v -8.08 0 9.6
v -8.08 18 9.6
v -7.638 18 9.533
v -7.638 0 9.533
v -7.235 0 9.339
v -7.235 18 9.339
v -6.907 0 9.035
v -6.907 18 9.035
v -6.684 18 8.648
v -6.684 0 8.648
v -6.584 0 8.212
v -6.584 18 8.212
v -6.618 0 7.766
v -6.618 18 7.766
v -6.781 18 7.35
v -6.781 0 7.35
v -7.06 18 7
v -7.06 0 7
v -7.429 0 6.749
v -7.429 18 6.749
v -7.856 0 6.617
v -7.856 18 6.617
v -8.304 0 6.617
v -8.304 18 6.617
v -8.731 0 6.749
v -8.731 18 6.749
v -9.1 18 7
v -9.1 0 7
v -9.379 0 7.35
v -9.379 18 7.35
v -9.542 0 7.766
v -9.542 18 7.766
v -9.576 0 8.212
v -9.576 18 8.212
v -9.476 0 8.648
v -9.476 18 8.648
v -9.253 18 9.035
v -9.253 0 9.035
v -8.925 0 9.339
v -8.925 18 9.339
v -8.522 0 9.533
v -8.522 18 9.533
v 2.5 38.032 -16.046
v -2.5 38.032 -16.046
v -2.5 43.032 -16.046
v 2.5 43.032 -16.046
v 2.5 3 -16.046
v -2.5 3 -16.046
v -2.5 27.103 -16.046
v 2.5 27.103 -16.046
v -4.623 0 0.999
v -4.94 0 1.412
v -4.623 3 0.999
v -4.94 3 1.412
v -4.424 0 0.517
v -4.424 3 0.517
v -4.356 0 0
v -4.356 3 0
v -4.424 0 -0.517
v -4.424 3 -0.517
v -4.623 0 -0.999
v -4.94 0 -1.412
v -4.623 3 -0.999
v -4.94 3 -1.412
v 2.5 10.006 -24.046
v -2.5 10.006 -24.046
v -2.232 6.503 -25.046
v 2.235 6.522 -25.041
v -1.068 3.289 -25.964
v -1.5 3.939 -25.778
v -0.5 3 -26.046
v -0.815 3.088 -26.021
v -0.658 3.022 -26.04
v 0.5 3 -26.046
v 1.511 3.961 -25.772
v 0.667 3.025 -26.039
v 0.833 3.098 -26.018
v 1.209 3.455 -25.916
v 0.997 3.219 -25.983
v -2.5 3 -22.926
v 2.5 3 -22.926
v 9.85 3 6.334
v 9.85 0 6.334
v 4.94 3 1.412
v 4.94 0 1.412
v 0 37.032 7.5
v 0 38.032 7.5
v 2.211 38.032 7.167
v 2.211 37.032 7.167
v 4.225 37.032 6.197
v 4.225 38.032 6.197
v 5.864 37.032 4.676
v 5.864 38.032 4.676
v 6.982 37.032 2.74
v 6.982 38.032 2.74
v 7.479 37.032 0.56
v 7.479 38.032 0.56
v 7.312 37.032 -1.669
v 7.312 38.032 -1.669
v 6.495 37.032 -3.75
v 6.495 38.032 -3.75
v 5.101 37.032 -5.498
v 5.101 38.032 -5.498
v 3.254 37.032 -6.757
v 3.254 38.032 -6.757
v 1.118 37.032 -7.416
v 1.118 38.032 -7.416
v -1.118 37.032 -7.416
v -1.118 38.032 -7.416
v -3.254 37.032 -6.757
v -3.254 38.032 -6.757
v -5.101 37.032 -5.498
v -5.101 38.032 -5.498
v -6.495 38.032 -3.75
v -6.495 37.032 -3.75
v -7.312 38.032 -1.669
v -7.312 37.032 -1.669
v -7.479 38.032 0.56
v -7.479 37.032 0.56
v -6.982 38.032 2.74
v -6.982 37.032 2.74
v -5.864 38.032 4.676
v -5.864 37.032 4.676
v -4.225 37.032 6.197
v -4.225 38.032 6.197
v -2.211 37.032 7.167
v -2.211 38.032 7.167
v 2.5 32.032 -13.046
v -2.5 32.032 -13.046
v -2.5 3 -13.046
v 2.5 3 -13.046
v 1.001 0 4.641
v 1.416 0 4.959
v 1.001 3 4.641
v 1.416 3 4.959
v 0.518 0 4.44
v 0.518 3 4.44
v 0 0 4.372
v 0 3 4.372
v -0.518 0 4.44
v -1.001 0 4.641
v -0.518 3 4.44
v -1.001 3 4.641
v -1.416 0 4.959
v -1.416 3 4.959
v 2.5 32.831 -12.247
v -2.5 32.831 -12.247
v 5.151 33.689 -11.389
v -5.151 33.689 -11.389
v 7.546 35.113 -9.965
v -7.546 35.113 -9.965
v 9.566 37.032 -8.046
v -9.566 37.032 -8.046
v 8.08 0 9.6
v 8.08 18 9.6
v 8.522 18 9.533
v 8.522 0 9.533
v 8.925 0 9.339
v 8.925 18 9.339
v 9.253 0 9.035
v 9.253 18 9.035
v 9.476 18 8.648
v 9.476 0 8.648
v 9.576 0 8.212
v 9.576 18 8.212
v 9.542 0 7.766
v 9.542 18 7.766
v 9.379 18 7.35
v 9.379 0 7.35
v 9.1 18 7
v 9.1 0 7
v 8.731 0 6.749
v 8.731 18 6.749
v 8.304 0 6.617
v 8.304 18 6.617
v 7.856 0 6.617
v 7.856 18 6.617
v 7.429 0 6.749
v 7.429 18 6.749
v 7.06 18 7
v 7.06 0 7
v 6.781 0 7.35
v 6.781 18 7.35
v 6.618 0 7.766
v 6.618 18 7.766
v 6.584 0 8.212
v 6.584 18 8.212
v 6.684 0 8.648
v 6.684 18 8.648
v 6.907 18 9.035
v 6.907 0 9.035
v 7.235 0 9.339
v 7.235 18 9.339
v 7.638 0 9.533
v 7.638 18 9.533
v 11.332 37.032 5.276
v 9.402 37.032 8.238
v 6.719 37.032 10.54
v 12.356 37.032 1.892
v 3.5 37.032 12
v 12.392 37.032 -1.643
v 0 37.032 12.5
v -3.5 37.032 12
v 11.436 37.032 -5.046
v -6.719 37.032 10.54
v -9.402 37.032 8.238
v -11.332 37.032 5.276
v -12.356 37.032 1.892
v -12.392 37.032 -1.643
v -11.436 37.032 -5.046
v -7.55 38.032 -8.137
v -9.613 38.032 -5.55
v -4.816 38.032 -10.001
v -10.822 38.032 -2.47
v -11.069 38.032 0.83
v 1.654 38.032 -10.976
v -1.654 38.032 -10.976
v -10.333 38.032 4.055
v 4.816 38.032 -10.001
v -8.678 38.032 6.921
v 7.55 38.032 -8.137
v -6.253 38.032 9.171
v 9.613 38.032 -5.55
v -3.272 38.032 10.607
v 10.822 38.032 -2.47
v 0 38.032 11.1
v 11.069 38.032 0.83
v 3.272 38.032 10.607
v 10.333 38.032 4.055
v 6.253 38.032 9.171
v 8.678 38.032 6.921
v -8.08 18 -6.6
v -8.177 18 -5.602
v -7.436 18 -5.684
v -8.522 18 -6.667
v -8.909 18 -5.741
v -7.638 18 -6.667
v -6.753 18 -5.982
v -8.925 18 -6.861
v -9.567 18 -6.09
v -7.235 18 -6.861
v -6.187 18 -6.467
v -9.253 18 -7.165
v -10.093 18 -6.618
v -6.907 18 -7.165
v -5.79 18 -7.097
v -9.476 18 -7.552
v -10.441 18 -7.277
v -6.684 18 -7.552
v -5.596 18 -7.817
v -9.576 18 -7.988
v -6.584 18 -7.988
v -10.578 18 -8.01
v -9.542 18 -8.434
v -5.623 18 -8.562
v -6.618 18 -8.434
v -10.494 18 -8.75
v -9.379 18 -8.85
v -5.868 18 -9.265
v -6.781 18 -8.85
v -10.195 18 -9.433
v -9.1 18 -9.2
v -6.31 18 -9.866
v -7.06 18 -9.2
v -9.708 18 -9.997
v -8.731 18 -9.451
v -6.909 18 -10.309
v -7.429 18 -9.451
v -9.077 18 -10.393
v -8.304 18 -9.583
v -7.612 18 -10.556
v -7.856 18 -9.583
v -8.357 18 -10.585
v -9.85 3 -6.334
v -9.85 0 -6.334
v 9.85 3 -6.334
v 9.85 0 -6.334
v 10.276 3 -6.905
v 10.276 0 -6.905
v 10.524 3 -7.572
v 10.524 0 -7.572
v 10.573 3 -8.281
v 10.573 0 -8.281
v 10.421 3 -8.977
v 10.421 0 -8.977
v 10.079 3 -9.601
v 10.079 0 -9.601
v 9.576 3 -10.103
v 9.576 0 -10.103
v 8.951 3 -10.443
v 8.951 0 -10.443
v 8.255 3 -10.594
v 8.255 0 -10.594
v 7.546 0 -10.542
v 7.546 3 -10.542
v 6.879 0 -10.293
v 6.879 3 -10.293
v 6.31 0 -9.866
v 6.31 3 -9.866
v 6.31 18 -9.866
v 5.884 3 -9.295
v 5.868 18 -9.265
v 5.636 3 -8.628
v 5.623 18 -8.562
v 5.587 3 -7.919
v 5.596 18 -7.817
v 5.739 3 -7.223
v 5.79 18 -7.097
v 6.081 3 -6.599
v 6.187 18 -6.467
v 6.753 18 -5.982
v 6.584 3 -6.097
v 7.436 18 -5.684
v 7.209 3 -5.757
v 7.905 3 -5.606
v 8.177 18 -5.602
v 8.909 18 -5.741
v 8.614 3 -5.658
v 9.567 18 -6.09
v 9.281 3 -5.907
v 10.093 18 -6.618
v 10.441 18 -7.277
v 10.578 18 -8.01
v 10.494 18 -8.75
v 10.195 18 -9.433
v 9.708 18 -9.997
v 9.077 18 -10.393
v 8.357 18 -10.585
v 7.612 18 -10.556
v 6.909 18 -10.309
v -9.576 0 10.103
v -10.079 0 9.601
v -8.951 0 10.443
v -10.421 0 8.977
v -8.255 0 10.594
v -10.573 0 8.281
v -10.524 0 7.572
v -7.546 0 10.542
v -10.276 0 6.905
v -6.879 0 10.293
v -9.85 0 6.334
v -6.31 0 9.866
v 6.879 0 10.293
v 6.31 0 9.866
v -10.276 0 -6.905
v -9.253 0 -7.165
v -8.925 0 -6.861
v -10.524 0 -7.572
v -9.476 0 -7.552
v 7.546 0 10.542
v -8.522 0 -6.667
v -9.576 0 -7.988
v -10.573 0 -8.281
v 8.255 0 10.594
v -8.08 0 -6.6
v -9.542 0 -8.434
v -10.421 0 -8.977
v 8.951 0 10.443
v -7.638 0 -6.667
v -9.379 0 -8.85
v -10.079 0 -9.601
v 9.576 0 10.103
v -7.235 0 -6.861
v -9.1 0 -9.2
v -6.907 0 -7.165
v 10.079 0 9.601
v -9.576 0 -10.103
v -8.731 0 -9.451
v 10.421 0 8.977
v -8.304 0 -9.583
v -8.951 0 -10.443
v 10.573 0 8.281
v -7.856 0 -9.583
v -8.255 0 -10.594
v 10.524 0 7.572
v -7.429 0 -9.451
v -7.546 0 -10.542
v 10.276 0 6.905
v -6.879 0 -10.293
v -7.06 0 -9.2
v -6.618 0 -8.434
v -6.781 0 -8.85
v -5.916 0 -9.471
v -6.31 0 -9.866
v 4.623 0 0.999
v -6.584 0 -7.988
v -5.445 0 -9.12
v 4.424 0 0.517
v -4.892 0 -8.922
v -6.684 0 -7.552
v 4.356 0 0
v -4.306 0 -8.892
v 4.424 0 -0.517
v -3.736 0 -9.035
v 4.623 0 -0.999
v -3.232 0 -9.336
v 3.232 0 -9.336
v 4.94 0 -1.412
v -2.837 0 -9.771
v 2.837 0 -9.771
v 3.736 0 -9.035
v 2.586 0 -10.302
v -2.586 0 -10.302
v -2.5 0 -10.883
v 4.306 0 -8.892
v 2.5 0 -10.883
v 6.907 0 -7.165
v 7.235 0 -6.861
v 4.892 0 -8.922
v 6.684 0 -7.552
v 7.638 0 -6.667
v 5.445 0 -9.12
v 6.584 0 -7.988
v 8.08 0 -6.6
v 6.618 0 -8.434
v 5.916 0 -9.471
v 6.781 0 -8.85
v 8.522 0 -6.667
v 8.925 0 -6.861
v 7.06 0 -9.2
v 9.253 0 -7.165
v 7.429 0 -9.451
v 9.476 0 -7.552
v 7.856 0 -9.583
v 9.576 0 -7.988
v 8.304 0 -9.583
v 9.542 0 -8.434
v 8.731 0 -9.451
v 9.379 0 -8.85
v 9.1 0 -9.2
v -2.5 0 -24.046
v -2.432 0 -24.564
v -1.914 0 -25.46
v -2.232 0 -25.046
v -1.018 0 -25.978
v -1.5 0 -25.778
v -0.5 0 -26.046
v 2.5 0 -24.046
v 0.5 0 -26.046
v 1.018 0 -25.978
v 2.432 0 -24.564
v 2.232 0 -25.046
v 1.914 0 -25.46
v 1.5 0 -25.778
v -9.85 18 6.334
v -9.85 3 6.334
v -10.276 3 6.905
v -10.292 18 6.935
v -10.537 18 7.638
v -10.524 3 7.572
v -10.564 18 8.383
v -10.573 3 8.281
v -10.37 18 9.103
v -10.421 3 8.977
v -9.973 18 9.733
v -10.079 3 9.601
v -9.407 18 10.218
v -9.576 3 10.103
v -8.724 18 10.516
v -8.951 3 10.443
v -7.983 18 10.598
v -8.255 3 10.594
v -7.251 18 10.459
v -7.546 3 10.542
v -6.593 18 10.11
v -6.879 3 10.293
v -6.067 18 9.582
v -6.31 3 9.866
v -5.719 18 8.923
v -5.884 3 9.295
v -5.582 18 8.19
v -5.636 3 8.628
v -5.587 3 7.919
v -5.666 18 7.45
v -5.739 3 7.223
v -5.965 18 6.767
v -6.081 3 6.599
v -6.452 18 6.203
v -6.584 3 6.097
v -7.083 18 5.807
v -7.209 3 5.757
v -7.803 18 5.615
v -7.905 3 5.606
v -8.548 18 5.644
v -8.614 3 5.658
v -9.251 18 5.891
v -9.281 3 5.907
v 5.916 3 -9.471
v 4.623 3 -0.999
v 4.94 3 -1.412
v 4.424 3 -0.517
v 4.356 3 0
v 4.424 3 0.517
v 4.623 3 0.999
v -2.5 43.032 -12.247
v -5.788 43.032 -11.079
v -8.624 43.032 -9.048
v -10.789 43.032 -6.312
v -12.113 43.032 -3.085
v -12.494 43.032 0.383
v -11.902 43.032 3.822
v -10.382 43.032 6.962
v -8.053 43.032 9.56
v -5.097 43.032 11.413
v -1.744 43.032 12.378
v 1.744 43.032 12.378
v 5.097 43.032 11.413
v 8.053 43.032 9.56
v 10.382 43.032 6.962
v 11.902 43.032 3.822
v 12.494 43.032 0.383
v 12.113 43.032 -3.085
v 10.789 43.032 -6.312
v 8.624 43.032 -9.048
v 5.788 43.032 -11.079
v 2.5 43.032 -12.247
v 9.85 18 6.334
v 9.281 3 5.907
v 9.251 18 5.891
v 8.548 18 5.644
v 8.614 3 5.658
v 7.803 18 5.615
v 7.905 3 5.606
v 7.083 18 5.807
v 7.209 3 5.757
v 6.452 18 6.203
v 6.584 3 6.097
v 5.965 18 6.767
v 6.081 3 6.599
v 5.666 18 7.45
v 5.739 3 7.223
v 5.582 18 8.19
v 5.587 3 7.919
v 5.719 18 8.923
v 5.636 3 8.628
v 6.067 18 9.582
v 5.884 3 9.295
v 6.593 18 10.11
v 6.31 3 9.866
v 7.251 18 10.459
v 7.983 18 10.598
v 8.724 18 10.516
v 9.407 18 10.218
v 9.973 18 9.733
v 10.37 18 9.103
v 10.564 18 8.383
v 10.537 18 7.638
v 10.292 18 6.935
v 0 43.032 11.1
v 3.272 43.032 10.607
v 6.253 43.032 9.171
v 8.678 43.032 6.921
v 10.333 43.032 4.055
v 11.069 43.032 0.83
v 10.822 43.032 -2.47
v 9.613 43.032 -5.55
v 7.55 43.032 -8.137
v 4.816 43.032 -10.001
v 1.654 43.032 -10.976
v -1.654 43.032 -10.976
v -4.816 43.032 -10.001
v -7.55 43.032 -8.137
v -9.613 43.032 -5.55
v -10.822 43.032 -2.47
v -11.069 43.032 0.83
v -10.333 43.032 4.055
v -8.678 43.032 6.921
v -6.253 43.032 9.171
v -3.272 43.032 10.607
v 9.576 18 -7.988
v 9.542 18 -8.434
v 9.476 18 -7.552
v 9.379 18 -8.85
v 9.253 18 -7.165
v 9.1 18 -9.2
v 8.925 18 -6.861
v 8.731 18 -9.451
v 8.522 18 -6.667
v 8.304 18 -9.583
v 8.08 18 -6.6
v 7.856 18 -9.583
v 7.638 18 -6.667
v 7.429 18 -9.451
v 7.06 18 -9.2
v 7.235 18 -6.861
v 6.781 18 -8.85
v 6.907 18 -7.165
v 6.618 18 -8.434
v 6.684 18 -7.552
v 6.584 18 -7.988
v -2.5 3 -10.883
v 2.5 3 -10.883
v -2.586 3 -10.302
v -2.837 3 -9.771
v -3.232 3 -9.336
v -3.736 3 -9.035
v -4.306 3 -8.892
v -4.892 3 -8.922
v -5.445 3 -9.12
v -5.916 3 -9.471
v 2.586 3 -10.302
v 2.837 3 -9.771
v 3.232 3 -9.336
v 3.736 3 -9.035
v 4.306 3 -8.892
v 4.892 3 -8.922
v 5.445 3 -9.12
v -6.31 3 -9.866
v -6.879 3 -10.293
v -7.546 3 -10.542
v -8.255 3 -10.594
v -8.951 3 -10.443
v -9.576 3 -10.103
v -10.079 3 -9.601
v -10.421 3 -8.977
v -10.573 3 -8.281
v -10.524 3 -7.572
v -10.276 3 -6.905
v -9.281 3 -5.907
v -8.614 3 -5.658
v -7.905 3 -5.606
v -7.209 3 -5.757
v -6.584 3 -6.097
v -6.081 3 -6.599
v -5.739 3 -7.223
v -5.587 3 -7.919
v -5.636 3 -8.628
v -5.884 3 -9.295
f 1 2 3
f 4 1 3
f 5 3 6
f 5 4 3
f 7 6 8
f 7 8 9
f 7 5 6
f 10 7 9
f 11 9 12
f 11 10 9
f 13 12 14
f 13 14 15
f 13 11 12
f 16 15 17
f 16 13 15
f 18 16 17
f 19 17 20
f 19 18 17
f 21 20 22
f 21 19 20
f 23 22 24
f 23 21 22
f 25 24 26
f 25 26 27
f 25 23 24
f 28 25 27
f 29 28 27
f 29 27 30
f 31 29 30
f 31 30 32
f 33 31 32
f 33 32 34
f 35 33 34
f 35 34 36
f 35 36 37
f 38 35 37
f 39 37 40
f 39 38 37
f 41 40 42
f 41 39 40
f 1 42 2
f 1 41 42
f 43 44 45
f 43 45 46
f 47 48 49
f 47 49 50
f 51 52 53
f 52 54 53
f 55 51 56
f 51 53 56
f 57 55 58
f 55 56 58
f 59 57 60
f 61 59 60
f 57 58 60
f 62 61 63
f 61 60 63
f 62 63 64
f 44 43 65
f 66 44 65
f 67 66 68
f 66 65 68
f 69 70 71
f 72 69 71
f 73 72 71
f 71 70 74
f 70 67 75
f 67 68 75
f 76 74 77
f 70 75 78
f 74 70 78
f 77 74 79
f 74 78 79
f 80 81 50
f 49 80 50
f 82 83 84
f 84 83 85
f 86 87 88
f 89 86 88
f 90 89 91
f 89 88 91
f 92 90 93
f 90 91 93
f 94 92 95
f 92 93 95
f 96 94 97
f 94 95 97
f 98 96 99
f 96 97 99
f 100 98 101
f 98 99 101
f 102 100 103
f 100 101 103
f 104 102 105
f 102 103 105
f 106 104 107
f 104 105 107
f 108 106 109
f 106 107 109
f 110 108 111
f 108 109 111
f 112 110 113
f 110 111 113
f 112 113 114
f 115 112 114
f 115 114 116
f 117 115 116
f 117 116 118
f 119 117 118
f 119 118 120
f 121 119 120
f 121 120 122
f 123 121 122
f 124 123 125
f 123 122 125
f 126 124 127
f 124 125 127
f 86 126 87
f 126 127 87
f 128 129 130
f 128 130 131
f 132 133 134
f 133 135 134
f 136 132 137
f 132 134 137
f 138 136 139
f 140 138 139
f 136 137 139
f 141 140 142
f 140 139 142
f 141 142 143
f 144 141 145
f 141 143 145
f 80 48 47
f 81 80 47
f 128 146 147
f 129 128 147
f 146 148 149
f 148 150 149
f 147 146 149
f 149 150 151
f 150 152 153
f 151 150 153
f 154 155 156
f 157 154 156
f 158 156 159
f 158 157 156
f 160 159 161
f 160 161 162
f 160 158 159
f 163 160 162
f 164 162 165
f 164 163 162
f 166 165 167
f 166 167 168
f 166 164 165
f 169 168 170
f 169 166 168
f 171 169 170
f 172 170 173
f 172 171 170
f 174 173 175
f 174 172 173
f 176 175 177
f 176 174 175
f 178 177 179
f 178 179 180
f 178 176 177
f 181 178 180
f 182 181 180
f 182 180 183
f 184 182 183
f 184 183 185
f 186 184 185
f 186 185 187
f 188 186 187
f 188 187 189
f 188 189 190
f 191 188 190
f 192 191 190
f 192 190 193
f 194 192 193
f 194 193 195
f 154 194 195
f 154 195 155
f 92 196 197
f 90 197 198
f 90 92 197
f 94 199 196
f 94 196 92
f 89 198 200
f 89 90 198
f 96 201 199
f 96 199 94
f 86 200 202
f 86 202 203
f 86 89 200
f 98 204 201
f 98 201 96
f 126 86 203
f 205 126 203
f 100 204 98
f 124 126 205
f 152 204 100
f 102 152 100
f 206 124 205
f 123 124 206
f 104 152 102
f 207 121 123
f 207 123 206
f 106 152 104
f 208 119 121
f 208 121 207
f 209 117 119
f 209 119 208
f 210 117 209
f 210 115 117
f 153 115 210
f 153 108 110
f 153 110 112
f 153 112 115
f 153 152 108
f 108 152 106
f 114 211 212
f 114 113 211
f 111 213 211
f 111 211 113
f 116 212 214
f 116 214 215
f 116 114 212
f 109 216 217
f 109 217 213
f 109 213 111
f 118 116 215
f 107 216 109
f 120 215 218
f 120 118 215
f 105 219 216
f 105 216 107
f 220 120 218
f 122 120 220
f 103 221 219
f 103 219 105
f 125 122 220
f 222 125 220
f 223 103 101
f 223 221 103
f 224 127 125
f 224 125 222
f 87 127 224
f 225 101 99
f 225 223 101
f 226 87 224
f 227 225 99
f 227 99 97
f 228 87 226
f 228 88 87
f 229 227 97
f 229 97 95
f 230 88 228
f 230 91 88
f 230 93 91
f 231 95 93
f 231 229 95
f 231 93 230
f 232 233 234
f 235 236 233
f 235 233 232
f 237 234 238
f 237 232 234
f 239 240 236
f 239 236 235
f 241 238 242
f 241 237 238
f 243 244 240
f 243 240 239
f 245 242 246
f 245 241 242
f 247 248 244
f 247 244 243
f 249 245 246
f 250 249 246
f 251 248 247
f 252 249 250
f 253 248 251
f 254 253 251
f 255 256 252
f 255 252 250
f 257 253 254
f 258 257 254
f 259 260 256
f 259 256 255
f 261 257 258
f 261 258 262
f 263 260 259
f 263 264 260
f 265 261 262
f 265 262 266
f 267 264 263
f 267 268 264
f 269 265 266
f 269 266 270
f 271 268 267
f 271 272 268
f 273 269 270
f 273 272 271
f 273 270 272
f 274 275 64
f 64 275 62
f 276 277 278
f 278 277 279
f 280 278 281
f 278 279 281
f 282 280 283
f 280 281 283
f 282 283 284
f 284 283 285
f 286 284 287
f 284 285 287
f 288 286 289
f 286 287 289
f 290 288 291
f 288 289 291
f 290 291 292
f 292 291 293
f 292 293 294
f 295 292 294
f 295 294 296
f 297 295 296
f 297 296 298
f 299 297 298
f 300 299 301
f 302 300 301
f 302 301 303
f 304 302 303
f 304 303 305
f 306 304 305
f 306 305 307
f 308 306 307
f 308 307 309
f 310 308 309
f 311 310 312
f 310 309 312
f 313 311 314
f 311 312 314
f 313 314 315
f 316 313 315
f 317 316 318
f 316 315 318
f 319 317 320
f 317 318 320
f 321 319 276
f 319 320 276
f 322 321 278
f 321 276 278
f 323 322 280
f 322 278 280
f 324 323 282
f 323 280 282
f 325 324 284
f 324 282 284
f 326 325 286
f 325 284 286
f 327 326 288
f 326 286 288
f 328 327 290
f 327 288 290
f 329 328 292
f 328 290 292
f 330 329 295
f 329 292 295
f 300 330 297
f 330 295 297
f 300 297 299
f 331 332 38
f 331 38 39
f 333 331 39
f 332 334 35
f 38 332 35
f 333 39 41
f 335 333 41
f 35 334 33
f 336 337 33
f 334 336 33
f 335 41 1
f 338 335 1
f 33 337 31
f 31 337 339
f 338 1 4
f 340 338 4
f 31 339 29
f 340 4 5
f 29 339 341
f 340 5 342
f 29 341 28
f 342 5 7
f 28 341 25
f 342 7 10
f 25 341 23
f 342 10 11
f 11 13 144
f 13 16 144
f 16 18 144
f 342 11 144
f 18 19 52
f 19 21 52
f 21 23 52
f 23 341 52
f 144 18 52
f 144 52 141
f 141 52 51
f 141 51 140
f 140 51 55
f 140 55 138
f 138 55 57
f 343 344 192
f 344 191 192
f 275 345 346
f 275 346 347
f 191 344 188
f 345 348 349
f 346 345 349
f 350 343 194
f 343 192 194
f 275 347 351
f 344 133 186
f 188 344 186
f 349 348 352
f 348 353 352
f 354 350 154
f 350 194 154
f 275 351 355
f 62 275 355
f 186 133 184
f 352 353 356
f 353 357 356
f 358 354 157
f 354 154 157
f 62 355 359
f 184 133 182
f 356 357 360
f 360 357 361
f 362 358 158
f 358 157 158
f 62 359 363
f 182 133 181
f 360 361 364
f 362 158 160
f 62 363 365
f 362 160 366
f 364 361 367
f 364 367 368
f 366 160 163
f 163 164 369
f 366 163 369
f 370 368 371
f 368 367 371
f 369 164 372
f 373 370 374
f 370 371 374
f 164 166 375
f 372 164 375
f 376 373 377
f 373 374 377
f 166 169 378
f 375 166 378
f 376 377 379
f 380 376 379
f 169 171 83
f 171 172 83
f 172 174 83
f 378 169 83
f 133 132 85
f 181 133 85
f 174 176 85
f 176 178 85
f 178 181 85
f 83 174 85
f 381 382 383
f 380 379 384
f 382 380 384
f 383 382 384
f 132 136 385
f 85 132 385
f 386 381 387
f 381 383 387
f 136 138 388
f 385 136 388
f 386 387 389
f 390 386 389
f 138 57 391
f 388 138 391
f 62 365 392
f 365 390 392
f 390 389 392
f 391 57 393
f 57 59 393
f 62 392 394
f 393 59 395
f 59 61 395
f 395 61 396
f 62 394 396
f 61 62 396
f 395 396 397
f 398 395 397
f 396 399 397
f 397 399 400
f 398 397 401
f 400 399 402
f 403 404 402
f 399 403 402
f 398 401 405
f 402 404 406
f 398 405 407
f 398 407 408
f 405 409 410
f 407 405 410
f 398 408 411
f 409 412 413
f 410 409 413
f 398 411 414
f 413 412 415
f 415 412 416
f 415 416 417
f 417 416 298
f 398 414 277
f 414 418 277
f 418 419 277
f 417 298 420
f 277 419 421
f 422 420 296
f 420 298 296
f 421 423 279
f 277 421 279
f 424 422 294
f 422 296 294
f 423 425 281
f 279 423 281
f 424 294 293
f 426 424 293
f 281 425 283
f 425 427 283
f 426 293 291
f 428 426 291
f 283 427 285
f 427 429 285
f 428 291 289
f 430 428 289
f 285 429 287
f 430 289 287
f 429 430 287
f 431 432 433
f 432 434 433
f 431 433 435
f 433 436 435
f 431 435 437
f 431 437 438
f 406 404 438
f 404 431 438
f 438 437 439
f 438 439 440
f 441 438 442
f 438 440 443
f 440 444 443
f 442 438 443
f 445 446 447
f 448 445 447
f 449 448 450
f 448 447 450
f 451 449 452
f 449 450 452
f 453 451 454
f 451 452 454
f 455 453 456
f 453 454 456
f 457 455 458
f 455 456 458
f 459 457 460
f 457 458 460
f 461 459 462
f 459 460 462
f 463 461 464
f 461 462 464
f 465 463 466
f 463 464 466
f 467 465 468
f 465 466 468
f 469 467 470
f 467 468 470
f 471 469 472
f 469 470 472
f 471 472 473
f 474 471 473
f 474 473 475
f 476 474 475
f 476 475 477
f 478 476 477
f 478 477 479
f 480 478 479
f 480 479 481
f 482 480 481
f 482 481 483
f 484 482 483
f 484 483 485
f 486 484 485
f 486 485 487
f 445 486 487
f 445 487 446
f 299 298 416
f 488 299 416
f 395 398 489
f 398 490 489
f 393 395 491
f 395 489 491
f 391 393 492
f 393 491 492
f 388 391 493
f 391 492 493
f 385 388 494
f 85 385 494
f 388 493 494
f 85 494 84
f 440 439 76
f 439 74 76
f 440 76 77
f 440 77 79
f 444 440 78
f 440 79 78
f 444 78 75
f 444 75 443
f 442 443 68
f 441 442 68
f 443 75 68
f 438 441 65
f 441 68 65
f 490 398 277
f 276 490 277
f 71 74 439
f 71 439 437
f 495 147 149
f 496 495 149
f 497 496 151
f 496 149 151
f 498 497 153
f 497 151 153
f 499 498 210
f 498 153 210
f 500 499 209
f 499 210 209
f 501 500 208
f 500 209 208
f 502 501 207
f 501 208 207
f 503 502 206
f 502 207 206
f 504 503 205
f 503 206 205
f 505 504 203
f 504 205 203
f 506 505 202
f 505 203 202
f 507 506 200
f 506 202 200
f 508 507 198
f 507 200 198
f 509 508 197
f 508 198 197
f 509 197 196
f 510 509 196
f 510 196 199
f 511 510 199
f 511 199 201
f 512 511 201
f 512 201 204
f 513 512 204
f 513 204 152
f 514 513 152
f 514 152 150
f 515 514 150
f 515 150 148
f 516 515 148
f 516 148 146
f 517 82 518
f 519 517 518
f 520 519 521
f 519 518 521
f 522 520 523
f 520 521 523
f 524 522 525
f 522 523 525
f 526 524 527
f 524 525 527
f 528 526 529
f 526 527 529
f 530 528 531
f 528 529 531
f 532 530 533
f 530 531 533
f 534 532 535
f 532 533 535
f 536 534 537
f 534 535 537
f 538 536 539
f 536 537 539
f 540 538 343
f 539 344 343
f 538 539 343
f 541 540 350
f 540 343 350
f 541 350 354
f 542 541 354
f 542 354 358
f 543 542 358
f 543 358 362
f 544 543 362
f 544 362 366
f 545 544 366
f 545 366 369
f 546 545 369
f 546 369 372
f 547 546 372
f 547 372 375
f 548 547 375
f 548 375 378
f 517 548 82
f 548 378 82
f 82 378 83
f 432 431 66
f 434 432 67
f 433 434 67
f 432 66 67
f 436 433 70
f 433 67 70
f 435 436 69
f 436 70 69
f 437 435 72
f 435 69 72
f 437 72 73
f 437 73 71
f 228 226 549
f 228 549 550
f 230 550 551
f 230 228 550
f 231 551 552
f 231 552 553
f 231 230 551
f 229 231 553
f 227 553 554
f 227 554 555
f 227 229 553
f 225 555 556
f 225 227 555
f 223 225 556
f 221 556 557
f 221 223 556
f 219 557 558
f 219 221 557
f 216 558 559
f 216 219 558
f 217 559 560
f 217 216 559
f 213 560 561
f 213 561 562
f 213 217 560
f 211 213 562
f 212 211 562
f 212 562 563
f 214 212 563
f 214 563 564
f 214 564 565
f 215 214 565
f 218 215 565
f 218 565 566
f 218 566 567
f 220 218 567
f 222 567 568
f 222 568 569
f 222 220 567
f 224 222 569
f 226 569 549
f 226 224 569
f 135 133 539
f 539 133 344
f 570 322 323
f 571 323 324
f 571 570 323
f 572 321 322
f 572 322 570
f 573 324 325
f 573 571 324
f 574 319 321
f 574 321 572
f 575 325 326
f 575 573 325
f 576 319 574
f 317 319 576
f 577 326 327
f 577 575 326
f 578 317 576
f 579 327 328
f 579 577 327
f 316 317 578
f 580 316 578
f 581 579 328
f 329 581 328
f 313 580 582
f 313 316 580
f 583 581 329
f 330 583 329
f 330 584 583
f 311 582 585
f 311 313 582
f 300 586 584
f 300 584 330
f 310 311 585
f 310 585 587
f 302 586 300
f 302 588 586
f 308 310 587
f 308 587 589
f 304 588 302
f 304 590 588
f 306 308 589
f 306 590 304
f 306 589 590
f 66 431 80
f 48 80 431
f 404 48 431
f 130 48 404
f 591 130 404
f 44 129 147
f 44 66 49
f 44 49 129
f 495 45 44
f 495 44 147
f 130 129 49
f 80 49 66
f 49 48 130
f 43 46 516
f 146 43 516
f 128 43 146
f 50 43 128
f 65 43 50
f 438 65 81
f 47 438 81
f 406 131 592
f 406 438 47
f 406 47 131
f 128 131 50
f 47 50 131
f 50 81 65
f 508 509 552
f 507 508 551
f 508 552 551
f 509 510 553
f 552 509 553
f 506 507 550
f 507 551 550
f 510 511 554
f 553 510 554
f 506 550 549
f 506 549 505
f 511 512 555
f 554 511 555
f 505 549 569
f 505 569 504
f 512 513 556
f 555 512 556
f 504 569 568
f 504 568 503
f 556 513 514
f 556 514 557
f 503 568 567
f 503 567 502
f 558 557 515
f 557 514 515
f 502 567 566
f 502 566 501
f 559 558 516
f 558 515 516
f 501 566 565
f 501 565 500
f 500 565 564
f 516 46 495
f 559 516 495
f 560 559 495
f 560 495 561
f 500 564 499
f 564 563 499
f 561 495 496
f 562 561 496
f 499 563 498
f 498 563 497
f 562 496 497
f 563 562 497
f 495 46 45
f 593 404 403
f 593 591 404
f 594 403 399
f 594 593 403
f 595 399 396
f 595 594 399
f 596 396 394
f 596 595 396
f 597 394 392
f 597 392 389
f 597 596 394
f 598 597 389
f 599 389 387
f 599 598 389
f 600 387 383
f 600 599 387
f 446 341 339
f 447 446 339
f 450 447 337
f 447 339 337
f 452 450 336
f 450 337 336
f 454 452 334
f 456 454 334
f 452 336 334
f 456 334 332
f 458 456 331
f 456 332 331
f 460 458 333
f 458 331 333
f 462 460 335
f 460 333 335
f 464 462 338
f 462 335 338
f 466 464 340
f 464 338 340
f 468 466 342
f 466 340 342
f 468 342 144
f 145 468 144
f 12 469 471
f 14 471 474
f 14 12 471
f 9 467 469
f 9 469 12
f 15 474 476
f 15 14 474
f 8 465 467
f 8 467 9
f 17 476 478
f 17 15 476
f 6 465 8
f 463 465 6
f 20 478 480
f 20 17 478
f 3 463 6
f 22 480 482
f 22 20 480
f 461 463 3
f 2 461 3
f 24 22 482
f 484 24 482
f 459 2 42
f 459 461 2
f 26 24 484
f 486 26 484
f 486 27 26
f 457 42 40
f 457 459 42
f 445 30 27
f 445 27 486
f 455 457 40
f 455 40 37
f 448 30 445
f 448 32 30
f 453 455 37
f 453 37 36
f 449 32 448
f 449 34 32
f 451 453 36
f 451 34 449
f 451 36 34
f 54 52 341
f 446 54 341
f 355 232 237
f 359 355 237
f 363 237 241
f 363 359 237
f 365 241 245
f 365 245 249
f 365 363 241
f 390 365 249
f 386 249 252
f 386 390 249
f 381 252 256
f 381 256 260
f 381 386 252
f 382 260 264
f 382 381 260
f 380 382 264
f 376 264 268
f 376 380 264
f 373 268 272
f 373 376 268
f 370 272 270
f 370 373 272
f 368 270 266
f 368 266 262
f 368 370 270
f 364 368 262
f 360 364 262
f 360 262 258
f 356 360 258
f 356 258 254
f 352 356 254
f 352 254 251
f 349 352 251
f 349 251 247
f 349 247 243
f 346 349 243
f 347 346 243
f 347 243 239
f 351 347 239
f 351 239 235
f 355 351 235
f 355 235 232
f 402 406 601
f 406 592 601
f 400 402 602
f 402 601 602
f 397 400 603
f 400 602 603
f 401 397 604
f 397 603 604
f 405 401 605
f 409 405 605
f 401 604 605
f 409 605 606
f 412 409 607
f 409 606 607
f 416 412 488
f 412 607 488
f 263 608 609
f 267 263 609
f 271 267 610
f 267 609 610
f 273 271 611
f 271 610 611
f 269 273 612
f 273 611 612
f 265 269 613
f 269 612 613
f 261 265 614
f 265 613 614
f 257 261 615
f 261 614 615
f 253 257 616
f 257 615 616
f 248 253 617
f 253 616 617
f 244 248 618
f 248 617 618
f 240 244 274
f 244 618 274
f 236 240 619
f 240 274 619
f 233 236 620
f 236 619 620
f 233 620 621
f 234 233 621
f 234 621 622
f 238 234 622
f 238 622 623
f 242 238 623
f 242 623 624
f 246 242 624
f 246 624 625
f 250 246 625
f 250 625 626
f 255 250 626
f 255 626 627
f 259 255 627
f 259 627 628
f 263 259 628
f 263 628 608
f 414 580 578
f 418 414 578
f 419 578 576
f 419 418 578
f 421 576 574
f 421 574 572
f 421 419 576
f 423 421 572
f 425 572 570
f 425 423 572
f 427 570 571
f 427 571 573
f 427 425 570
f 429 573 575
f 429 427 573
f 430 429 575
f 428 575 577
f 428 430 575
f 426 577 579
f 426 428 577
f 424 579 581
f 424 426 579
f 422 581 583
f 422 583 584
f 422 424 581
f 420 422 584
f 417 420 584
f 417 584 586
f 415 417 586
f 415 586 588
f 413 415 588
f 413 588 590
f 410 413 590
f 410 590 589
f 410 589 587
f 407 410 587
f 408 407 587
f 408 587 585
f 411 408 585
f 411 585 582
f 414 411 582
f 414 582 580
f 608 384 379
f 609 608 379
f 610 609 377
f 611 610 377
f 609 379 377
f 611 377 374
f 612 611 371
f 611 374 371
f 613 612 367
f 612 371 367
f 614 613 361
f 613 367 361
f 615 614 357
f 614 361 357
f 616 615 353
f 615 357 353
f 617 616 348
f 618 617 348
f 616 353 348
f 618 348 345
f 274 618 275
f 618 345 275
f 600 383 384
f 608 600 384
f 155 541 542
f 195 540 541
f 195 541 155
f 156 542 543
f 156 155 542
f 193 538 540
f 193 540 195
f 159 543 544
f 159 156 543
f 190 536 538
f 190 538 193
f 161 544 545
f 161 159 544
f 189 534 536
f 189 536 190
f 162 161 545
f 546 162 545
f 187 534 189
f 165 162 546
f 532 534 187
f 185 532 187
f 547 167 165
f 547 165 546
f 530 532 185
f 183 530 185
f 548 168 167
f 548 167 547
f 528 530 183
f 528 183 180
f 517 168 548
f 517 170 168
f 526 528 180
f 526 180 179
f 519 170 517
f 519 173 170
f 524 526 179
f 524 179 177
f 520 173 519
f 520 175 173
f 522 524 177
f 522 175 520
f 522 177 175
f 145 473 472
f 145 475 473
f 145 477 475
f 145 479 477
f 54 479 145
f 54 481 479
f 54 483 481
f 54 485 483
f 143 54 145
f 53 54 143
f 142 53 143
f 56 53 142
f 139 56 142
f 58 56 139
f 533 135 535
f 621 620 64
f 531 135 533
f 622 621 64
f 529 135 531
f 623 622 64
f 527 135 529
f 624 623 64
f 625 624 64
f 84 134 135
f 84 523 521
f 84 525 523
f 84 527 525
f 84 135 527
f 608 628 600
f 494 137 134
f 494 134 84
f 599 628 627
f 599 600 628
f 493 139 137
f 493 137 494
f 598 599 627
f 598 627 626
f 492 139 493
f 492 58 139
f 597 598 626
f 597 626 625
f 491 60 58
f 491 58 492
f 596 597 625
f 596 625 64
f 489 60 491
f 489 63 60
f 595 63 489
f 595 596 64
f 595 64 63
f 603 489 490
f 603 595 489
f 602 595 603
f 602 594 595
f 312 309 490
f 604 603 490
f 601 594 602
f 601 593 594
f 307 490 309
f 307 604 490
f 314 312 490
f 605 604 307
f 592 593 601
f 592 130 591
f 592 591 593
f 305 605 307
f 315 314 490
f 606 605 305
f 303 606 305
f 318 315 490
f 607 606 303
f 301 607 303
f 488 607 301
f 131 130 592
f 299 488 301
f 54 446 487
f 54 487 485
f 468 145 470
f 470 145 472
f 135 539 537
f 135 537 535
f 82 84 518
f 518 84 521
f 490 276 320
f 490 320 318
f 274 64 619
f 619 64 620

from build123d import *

# Parameters (mm, degrees)
SKETCH_1_R           = 1.5
EXTRUDE_1_DEPTH      = 3
SKETCH_2_R           = 2.5
SKETCH_2_R_2         = 1.5
EXTRUDE_2_DEPTH      = 15
SKETCH_3_W           = 5
SKETCH_3_H           = 3
EXTRUDE_3_DEPTH      = 35.032354187
EXTRUDE_4_DEPTH      = 5
SKETCH_5_R           = 12.5
SKETCH_5_R_2         = 7.5
EXTRUDE_5_DEPTH      = 1
SKETCH_6_R           = 12.5
SKETCH_6_R_2         = 11.1
EXTRUDE_6_DEPTH      = 5
EXTRUDE_7_DEPTH      = 5
EXTRUDE_7_DEPTH_BACK = 1
CHAMFER_1_SIZE       = 5
FILLET_1_R           = 2


with BuildPart() as part:
    # Эскиз1 → Бобышка-Вытянуть1 (new body)
    with BuildSketch(Plane(origin=(0, 0, 0), x_dir=(1, 0, 0), z_dir=(0, 1, 0))):
        with BuildLine():
            Line((-6.310049273, -9.865580478), (0, -3.539912271))
            Line((0, -3.539912271), (6.310049273, -9.865580478))
            ThreePointArc((6.310049273, -9.865580478), (9.845580478, -9.869950727), (9.849950727, -6.334419522))
            Line((9.849950727, -6.334419522), (3.531171747, 0))
            Line((3.531171747, 0), (9.849950727, 6.334419522))
            ThreePointArc((9.849950727, 6.334419522), (9.845580478, 9.869950727), (6.310049273, 9.865580478))
            Line((6.310049273, 9.865580478), (2.5, 6.04610039))
            Line((2.5, 6.04610039), (2.5, 26.04610039))
            Line((2.5, 26.04610039), (-2.5, 26.04610039))
            Line((-2.5, 26.04610039), (-2.5, 6.04610039))
            Line((-2.5, 6.04610039), (-6.310049273, 9.865580478))
            ThreePointArc((-6.310049273, 9.865580478), (-9.845580478, 9.869950727), (-9.849950727, 6.334419522))
            Line((-9.849950727, 6.334419522), (-3.531171747, 0))
            Line((-3.531171747, 0), (-9.849950727, -6.334419522))
            ThreePointArc((-9.849950727, -6.334419522), (-9.845580478, -9.869950727), (-6.310049273, -9.865580478))
        make_face()
        with Locations(Location((-8.08, 8.1, 0), (0, 0, 270))):
            Circle(SKETCH_1_R, mode=Mode.SUBTRACT)
        with Locations(Location((8.08, 8.1, 0), (0, 0, 270))):
            Circle(SKETCH_1_R, mode=Mode.SUBTRACT)
        with Locations(Location((-8.08, -8.1, 0), (0, 0, 270))):
            Circle(SKETCH_1_R, mode=Mode.SUBTRACT)
        with Locations(Location((8.08, -8.1, 0), (0, 0, 270))):
            Circle(SKETCH_1_R, mode=Mode.SUBTRACT)
    extrude(amount=EXTRUDE_1_DEPTH)

    # Эскиз2 → Бобышка-Вытянуть2 (add)
    # profile 1 of 4: a face of its own
    with BuildSketch(Plane(origin=(0, 3, 0), x_dir=(1, 0, 0), z_dir=(0, 1, 0))):
        with Locations(Location((-8.08, -8.1, 0), (0, 0, 135.07082293))):
            Circle(SKETCH_2_R)
        with Locations(Location((-8.08, -8.1, 0), (0, 0, 270))):
            Circle(SKETCH_2_R_2, mode=Mode.SUBTRACT)
    # profile 2 of 4: a face of its own
    with BuildSketch(Plane(origin=(0, 3, 0), x_dir=(1, 0, 0), z_dir=(0, 1, 0))):
        with Locations(Location((-8.08, 8.1, 0), (0, 0, 44.92917707))):
            Circle(SKETCH_2_R)
        with Locations(Location((-8.08, 8.1, 0), (0, 0, 270))):
            Circle(SKETCH_2_R_2, mode=Mode.SUBTRACT)
    # profile 3 of 4: a face of its own
    with BuildSketch(Plane(origin=(0, 3, 0), x_dir=(1, 0, 0), z_dir=(0, 1, 0))):
        with Locations(Location((8.08, 8.1, 0), (0, 0, 135.07082293))):
            Circle(SKETCH_2_R)
        with Locations(Location((8.08, 8.1, 0), (0, 0, 270))):
            Circle(SKETCH_2_R_2, mode=Mode.SUBTRACT)
    # profile 4 of 4: a face of its own
    with BuildSketch(Plane(origin=(0, 3, 0), x_dir=(1, 0, 0), z_dir=(0, 1, 0))):
        with Locations(Location((8.08, -8.1, 0), (0, 0, 44.92917707))):
            Circle(SKETCH_2_R)
        with Locations(Location((8.08, -8.1, 0), (0, 0, 270))):
            Circle(SKETCH_2_R_2, mode=Mode.SUBTRACT)
    extrude(amount=EXTRUDE_2_DEPTH)

    # Эскиз3 → Бобышка-Вытянуть3 (add)
    with BuildSketch(Plane(origin=(0, 3, 0), x_dir=(1, 0, 0), z_dir=(0, 1, 0))):
        with Locations((0, 14.54610039)):
            Rectangle(SKETCH_3_W, SKETCH_3_H)
    extrude(amount=EXTRUDE_3_DEPTH)

    # Эскиз4 → Бобышка-Вытянуть4 (add)
    with BuildSketch(Plane(origin=(2.5, 0, 0), x_dir=(0, 0, -1), z_dir=(1, 0, 0))):
        Polygon((16.04610039, 38.032354187), (26.04610039, 3), (22.926270675, 3), (16.04610039, 27.10285623), align=None)
    extrude(amount=-EXTRUDE_4_DEPTH)



with BuildPart() as body_2:
    # Эскиз5 → Бобышка-Вытянуть5 (new body)
    with BuildSketch(Plane(origin=(0, 38.032354187, 0), x_dir=(1, 0, 0), z_dir=(0, 1, 0))):
        with Locations(Location((0, 0, 0), (0, 0, 270))):
            Circle(SKETCH_5_R)
        with Locations(Location((0, 0, 0), (0, 0, 270))):
            Circle(SKETCH_5_R_2, mode=Mode.SUBTRACT)
    extrude(amount=-EXTRUDE_5_DEPTH)

    # Эскиз6 → Бобышка-Вытянуть6 (add)
    with BuildSketch(Plane(origin=(0, 38.032354187, 0), x_dir=(1, 0, 0), z_dir=(0, 1, 0))):
        with Locations(Location((0, 0, 0), (0, 0, 270))):
            Circle(SKETCH_6_R)
        with Locations(Location((0, 0, 0), (0, 0, 270))):
            Circle(SKETCH_6_R_2, mode=Mode.SUBTRACT)
    extrude(amount=EXTRUDE_6_DEPTH)


with BuildPart() as part_1:
    add(part.part)

    add(body_2.part)  # Бобышка-Вытянуть7 merges body 2
    # Эскиз7 → Бобышка-Вытянуть7 (add, two sides: drawn at the far end of the back side and taken through both)
    with BuildSketch(Plane(origin=(0, 38.032354187, 0), x_dir=(1, 0, 0), z_dir=(0, 1, 0)).offset(-EXTRUDE_7_DEPTH_BACK)):
        with BuildLine():
            Line((-2.5, 16.04610039), (2.5, 16.04610039))
            Line((2.5, 16.04610039), (2.5, 12.247448714))
            ThreePointArc((2.5, 12.247448714), (0, 12.5), (-2.5, 12.247448714))
            Line((-2.5, 12.247448714), (-2.5, 16.04610039))
        make_face()
    extrude(amount=EXTRUDE_7_DEPTH + EXTRUDE_7_DEPTH_BACK)

    # Фаска1
    chamfer_1_edges = [part_1.edges().sort_by_distance(p)[0] for p in [
        (0, 37.032354187, -13.04610039),
    ]]
    chamfer(chamfer_1_edges, length=CHAMFER_1_SIZE)

    # Скругление1
    fillet_1_edges = [part_1.edges().sort_by_distance(p)[0] for p in [
        (-3.531171747, 1.5, 0),
        (-2.5, 1.5, -6.04610039),
        (-2.5, 1.5, -26.04610039),
        (2.5, 1.5, -26.04610039),
        (2.5, 1.5, -6.04610039),
        (3.531171747, 1.5, 0),
        (0, 1.5, 3.539912271),
    ]]
    fillet(fillet_1_edges, radius=FILLET_1_R)


solid = part_1.part
